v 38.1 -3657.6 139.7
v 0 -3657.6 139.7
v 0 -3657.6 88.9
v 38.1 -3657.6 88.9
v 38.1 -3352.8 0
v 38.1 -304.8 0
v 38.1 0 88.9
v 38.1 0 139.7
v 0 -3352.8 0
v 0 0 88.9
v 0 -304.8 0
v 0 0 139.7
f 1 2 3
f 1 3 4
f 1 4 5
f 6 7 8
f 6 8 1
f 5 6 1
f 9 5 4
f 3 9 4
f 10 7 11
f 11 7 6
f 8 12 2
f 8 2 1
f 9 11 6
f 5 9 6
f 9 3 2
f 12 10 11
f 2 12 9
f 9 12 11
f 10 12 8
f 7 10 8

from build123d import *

# Parameters (mm, degrees)
F0_W     = 38.1
F0_H     = 139.7
F1_DEPTH = 3657.6
F3_DEPTH = 38.101


with BuildPart() as f1:
    # F0 (on Front) → F1 (new body)
    with BuildSketch(Plane.XZ):
        with Locations((19.05, 69.85)):
            Rectangle(F0_W, F0_H)
    extrude(amount=F1_DEPTH)

    # F2 (on face) → F3 (cut, through all)
    with BuildSketch(Plane.YZ.offset(38.1)):
        Polygon((-3657.6, 88.9), (-3657.6, 0), (-3352.8, 0), align=None)
        Polygon((0, 88.9), (-304.8, 0), (0, 0), align=None)
    extrude(amount=-F3_DEPTH, mode=Mode.SUBTRACT)


solid = f1.part
